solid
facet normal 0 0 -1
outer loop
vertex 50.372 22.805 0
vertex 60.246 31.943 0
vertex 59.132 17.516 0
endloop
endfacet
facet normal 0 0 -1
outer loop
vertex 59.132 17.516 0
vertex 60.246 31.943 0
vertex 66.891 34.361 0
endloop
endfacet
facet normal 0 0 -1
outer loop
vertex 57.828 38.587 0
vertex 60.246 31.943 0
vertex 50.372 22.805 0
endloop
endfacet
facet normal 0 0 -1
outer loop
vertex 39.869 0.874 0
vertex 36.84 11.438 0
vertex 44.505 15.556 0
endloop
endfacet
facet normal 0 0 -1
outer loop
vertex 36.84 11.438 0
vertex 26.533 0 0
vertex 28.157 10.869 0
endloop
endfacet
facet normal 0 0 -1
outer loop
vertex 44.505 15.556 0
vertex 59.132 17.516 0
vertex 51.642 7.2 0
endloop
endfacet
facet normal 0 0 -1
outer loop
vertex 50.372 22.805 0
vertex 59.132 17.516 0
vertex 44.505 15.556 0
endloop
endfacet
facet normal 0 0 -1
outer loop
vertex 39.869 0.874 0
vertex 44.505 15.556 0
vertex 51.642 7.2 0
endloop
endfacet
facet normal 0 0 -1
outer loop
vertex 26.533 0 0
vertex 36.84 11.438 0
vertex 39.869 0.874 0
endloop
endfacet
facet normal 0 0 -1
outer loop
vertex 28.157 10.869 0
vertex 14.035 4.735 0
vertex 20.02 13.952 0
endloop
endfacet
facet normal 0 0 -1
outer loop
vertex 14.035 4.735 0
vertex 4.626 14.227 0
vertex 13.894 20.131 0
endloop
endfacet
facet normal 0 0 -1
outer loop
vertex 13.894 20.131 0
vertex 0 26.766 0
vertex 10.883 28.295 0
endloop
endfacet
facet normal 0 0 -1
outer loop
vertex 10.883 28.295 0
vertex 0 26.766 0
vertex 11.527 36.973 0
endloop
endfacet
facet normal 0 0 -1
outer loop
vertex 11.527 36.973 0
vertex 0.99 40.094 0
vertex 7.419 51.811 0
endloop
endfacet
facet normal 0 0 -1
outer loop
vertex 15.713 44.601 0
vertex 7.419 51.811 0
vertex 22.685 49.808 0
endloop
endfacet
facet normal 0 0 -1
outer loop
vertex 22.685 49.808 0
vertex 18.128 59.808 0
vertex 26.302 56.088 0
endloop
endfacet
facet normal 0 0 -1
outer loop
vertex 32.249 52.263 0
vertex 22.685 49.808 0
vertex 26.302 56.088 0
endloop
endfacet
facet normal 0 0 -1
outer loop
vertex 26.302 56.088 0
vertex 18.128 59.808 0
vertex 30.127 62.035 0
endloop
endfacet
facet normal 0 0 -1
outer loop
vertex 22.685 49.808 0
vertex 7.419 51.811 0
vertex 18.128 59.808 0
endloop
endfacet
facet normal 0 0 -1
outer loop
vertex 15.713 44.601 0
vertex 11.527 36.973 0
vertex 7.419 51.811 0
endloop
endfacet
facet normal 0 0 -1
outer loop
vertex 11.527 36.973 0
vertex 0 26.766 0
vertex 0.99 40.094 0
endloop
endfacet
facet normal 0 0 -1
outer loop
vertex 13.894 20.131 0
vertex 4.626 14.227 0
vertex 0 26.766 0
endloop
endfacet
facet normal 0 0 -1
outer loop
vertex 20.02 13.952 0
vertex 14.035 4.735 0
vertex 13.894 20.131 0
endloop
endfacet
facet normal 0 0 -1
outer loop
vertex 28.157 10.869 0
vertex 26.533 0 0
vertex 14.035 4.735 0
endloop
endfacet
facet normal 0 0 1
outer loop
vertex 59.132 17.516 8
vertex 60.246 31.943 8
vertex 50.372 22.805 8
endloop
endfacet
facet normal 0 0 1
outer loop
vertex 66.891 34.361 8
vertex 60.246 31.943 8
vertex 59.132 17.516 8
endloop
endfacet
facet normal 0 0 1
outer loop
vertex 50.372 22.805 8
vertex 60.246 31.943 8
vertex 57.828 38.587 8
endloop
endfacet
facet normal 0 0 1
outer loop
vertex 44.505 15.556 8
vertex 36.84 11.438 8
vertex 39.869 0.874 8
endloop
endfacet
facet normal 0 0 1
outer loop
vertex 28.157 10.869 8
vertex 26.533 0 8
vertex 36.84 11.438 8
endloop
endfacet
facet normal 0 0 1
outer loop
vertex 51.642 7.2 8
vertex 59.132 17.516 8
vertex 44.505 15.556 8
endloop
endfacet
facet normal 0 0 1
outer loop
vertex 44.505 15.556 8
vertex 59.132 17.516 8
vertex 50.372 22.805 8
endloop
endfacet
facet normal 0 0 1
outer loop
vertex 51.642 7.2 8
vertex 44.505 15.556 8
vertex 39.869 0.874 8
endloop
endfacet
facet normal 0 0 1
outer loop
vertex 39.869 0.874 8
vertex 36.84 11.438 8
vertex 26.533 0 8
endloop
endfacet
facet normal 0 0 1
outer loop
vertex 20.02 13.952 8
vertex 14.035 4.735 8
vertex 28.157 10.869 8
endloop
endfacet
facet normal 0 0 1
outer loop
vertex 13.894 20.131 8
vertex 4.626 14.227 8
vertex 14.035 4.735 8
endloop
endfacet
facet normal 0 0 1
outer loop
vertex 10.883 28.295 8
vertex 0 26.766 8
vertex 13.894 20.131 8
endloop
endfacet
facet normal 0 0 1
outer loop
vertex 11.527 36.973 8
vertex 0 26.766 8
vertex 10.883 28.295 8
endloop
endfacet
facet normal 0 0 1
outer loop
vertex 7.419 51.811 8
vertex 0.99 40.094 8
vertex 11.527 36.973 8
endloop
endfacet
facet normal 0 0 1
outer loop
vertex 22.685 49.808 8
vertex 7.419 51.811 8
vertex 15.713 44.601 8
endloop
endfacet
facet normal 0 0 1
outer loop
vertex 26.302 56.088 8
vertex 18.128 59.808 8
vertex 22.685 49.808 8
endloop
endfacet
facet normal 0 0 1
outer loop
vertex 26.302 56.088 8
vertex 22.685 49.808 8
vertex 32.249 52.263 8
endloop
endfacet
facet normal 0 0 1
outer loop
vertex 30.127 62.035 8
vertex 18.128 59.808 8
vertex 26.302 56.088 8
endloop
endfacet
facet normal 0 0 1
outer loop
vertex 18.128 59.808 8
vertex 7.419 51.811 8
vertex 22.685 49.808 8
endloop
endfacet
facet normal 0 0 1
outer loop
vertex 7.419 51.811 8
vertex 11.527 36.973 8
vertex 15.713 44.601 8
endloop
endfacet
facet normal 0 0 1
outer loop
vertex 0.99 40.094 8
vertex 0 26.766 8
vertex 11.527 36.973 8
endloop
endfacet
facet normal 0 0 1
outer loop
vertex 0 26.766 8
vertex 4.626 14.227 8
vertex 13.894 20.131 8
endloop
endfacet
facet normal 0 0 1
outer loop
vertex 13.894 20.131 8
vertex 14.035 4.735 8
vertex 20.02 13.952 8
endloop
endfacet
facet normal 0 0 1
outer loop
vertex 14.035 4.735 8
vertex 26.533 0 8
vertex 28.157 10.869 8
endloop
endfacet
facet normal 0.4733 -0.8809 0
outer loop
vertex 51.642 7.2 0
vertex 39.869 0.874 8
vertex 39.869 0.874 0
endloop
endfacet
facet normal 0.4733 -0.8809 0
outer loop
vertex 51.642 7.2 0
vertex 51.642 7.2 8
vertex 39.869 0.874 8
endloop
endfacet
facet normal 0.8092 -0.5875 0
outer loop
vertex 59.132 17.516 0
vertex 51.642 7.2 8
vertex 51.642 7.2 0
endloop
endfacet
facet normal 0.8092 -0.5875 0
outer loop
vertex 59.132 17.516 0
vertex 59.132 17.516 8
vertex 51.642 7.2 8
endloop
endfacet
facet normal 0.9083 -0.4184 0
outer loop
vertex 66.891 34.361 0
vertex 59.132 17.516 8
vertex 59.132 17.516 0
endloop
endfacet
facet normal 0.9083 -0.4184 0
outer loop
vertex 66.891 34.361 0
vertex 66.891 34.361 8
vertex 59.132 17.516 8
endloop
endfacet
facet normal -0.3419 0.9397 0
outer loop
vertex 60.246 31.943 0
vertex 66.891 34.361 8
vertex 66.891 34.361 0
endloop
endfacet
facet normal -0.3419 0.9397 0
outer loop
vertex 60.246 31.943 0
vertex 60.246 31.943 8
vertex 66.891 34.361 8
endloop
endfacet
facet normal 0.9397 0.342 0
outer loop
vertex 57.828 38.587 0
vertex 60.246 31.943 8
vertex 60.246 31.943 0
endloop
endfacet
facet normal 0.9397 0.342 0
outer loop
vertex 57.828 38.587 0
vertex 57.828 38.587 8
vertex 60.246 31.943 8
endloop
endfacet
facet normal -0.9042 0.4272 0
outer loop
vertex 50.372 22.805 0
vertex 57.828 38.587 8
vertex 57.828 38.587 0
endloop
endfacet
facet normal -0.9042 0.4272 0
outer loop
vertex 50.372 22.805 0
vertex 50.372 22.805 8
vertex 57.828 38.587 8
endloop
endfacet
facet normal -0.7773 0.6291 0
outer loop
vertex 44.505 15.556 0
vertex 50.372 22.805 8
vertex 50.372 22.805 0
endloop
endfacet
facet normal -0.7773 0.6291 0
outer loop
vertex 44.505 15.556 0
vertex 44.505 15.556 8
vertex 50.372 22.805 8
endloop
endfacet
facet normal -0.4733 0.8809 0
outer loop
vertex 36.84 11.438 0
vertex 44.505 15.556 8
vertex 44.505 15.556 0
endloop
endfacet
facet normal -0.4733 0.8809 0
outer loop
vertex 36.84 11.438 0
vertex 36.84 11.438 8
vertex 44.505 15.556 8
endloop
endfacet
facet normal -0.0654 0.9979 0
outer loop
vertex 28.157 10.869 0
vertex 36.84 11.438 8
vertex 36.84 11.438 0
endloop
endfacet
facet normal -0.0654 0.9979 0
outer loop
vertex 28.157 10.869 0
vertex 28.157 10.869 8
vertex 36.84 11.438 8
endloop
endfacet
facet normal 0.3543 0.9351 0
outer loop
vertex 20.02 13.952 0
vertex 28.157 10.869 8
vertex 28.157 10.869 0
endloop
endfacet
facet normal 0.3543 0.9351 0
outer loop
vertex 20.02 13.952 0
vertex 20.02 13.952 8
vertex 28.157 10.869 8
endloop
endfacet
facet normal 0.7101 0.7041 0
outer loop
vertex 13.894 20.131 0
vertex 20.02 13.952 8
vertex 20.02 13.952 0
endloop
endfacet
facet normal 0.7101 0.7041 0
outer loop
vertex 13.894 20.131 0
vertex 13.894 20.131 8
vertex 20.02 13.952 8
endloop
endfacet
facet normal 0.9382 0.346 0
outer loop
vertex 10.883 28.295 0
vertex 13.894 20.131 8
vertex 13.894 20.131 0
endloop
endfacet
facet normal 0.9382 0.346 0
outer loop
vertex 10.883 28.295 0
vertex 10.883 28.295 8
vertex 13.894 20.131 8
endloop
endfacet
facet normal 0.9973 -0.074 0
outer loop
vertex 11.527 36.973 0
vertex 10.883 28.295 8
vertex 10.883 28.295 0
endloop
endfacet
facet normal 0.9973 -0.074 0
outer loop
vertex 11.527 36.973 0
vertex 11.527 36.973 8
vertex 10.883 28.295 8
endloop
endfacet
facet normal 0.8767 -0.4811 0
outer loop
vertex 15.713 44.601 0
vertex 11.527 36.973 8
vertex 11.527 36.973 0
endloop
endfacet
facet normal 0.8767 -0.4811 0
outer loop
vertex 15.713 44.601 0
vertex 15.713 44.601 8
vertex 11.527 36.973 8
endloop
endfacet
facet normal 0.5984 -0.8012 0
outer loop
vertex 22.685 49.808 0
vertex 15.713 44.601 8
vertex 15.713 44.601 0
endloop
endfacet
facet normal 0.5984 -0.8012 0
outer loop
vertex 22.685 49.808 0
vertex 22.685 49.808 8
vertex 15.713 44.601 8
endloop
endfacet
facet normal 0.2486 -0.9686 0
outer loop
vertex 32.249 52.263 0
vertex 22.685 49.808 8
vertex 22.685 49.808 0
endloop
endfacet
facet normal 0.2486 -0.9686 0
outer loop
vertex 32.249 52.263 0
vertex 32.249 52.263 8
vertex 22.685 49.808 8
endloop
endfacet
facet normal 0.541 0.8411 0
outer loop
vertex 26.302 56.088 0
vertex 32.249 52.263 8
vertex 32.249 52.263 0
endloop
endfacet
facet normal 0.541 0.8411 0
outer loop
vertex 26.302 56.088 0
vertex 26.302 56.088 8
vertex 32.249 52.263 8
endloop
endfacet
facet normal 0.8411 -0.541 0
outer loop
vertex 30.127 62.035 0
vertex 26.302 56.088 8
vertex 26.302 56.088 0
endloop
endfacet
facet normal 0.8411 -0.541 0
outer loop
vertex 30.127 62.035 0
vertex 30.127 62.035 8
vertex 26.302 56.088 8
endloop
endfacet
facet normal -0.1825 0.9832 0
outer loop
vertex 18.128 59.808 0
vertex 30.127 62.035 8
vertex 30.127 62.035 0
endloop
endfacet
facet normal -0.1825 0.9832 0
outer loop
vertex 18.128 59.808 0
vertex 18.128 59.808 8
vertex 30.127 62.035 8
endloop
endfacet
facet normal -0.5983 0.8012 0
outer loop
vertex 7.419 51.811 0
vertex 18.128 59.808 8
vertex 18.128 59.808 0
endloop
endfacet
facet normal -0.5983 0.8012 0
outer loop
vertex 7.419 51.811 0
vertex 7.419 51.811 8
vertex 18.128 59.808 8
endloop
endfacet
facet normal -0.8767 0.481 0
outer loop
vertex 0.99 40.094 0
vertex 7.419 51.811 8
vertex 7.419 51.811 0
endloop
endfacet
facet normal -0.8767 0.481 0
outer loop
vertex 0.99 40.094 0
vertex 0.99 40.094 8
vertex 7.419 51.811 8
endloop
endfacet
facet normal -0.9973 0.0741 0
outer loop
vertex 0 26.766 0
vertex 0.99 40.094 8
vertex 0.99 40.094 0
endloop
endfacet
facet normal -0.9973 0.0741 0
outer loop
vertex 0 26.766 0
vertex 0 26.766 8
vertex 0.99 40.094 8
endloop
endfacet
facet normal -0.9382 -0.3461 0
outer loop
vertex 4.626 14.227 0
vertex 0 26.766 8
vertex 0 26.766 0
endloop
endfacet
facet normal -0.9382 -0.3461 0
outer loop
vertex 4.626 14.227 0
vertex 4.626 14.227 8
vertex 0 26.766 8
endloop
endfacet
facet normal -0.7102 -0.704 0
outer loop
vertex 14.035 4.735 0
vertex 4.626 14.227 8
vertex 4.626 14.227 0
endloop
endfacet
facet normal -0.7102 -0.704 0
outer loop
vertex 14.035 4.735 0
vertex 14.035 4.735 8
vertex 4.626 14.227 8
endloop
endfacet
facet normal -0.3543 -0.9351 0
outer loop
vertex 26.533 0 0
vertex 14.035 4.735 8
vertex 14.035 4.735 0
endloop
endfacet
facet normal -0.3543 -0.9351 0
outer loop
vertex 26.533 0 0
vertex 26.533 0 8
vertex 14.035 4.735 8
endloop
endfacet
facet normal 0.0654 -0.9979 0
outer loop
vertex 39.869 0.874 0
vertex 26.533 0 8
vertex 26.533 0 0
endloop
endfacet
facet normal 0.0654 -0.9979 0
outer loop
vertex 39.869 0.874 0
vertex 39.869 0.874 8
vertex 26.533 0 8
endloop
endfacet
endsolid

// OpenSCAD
$fn = 32;

// ----------------------------------------------------------------------
// Hook plate: curl radius 26 mm over 245 degrees, 10 mm thick band
// ----------------------------------------------------------------------

// --- parameters (mm) ---
profile_height = 8;       // extrusion height
profile_points = 26;      // points of the closed outline

profile = [[26.302, 56.088], [30.127, 62.035], [18.128, 59.808], [7.419, 51.811], [0.99, 40.094], [0, 26.766], [4.626, 14.227], [14.035, 4.735], [26.533, 0], [39.869, 0.874], [51.642, 7.2], [59.132, 17.516], [66.891, 34.361], [60.246, 31.943], [57.828, 38.587], [50.372, 22.805], [44.505, 15.556], [36.84, 11.438], [28.157, 10.869], [20.02, 13.952], [13.894, 20.131], [10.883, 28.295], [11.527, 36.973], [15.713, 44.601], [22.685, 49.808], [32.249, 52.263]];  // single closed polygon, 26 points, counter clockwise

// --- the one profile operation ---
linear_extrude(height = profile_height) polygon(points = profile);
